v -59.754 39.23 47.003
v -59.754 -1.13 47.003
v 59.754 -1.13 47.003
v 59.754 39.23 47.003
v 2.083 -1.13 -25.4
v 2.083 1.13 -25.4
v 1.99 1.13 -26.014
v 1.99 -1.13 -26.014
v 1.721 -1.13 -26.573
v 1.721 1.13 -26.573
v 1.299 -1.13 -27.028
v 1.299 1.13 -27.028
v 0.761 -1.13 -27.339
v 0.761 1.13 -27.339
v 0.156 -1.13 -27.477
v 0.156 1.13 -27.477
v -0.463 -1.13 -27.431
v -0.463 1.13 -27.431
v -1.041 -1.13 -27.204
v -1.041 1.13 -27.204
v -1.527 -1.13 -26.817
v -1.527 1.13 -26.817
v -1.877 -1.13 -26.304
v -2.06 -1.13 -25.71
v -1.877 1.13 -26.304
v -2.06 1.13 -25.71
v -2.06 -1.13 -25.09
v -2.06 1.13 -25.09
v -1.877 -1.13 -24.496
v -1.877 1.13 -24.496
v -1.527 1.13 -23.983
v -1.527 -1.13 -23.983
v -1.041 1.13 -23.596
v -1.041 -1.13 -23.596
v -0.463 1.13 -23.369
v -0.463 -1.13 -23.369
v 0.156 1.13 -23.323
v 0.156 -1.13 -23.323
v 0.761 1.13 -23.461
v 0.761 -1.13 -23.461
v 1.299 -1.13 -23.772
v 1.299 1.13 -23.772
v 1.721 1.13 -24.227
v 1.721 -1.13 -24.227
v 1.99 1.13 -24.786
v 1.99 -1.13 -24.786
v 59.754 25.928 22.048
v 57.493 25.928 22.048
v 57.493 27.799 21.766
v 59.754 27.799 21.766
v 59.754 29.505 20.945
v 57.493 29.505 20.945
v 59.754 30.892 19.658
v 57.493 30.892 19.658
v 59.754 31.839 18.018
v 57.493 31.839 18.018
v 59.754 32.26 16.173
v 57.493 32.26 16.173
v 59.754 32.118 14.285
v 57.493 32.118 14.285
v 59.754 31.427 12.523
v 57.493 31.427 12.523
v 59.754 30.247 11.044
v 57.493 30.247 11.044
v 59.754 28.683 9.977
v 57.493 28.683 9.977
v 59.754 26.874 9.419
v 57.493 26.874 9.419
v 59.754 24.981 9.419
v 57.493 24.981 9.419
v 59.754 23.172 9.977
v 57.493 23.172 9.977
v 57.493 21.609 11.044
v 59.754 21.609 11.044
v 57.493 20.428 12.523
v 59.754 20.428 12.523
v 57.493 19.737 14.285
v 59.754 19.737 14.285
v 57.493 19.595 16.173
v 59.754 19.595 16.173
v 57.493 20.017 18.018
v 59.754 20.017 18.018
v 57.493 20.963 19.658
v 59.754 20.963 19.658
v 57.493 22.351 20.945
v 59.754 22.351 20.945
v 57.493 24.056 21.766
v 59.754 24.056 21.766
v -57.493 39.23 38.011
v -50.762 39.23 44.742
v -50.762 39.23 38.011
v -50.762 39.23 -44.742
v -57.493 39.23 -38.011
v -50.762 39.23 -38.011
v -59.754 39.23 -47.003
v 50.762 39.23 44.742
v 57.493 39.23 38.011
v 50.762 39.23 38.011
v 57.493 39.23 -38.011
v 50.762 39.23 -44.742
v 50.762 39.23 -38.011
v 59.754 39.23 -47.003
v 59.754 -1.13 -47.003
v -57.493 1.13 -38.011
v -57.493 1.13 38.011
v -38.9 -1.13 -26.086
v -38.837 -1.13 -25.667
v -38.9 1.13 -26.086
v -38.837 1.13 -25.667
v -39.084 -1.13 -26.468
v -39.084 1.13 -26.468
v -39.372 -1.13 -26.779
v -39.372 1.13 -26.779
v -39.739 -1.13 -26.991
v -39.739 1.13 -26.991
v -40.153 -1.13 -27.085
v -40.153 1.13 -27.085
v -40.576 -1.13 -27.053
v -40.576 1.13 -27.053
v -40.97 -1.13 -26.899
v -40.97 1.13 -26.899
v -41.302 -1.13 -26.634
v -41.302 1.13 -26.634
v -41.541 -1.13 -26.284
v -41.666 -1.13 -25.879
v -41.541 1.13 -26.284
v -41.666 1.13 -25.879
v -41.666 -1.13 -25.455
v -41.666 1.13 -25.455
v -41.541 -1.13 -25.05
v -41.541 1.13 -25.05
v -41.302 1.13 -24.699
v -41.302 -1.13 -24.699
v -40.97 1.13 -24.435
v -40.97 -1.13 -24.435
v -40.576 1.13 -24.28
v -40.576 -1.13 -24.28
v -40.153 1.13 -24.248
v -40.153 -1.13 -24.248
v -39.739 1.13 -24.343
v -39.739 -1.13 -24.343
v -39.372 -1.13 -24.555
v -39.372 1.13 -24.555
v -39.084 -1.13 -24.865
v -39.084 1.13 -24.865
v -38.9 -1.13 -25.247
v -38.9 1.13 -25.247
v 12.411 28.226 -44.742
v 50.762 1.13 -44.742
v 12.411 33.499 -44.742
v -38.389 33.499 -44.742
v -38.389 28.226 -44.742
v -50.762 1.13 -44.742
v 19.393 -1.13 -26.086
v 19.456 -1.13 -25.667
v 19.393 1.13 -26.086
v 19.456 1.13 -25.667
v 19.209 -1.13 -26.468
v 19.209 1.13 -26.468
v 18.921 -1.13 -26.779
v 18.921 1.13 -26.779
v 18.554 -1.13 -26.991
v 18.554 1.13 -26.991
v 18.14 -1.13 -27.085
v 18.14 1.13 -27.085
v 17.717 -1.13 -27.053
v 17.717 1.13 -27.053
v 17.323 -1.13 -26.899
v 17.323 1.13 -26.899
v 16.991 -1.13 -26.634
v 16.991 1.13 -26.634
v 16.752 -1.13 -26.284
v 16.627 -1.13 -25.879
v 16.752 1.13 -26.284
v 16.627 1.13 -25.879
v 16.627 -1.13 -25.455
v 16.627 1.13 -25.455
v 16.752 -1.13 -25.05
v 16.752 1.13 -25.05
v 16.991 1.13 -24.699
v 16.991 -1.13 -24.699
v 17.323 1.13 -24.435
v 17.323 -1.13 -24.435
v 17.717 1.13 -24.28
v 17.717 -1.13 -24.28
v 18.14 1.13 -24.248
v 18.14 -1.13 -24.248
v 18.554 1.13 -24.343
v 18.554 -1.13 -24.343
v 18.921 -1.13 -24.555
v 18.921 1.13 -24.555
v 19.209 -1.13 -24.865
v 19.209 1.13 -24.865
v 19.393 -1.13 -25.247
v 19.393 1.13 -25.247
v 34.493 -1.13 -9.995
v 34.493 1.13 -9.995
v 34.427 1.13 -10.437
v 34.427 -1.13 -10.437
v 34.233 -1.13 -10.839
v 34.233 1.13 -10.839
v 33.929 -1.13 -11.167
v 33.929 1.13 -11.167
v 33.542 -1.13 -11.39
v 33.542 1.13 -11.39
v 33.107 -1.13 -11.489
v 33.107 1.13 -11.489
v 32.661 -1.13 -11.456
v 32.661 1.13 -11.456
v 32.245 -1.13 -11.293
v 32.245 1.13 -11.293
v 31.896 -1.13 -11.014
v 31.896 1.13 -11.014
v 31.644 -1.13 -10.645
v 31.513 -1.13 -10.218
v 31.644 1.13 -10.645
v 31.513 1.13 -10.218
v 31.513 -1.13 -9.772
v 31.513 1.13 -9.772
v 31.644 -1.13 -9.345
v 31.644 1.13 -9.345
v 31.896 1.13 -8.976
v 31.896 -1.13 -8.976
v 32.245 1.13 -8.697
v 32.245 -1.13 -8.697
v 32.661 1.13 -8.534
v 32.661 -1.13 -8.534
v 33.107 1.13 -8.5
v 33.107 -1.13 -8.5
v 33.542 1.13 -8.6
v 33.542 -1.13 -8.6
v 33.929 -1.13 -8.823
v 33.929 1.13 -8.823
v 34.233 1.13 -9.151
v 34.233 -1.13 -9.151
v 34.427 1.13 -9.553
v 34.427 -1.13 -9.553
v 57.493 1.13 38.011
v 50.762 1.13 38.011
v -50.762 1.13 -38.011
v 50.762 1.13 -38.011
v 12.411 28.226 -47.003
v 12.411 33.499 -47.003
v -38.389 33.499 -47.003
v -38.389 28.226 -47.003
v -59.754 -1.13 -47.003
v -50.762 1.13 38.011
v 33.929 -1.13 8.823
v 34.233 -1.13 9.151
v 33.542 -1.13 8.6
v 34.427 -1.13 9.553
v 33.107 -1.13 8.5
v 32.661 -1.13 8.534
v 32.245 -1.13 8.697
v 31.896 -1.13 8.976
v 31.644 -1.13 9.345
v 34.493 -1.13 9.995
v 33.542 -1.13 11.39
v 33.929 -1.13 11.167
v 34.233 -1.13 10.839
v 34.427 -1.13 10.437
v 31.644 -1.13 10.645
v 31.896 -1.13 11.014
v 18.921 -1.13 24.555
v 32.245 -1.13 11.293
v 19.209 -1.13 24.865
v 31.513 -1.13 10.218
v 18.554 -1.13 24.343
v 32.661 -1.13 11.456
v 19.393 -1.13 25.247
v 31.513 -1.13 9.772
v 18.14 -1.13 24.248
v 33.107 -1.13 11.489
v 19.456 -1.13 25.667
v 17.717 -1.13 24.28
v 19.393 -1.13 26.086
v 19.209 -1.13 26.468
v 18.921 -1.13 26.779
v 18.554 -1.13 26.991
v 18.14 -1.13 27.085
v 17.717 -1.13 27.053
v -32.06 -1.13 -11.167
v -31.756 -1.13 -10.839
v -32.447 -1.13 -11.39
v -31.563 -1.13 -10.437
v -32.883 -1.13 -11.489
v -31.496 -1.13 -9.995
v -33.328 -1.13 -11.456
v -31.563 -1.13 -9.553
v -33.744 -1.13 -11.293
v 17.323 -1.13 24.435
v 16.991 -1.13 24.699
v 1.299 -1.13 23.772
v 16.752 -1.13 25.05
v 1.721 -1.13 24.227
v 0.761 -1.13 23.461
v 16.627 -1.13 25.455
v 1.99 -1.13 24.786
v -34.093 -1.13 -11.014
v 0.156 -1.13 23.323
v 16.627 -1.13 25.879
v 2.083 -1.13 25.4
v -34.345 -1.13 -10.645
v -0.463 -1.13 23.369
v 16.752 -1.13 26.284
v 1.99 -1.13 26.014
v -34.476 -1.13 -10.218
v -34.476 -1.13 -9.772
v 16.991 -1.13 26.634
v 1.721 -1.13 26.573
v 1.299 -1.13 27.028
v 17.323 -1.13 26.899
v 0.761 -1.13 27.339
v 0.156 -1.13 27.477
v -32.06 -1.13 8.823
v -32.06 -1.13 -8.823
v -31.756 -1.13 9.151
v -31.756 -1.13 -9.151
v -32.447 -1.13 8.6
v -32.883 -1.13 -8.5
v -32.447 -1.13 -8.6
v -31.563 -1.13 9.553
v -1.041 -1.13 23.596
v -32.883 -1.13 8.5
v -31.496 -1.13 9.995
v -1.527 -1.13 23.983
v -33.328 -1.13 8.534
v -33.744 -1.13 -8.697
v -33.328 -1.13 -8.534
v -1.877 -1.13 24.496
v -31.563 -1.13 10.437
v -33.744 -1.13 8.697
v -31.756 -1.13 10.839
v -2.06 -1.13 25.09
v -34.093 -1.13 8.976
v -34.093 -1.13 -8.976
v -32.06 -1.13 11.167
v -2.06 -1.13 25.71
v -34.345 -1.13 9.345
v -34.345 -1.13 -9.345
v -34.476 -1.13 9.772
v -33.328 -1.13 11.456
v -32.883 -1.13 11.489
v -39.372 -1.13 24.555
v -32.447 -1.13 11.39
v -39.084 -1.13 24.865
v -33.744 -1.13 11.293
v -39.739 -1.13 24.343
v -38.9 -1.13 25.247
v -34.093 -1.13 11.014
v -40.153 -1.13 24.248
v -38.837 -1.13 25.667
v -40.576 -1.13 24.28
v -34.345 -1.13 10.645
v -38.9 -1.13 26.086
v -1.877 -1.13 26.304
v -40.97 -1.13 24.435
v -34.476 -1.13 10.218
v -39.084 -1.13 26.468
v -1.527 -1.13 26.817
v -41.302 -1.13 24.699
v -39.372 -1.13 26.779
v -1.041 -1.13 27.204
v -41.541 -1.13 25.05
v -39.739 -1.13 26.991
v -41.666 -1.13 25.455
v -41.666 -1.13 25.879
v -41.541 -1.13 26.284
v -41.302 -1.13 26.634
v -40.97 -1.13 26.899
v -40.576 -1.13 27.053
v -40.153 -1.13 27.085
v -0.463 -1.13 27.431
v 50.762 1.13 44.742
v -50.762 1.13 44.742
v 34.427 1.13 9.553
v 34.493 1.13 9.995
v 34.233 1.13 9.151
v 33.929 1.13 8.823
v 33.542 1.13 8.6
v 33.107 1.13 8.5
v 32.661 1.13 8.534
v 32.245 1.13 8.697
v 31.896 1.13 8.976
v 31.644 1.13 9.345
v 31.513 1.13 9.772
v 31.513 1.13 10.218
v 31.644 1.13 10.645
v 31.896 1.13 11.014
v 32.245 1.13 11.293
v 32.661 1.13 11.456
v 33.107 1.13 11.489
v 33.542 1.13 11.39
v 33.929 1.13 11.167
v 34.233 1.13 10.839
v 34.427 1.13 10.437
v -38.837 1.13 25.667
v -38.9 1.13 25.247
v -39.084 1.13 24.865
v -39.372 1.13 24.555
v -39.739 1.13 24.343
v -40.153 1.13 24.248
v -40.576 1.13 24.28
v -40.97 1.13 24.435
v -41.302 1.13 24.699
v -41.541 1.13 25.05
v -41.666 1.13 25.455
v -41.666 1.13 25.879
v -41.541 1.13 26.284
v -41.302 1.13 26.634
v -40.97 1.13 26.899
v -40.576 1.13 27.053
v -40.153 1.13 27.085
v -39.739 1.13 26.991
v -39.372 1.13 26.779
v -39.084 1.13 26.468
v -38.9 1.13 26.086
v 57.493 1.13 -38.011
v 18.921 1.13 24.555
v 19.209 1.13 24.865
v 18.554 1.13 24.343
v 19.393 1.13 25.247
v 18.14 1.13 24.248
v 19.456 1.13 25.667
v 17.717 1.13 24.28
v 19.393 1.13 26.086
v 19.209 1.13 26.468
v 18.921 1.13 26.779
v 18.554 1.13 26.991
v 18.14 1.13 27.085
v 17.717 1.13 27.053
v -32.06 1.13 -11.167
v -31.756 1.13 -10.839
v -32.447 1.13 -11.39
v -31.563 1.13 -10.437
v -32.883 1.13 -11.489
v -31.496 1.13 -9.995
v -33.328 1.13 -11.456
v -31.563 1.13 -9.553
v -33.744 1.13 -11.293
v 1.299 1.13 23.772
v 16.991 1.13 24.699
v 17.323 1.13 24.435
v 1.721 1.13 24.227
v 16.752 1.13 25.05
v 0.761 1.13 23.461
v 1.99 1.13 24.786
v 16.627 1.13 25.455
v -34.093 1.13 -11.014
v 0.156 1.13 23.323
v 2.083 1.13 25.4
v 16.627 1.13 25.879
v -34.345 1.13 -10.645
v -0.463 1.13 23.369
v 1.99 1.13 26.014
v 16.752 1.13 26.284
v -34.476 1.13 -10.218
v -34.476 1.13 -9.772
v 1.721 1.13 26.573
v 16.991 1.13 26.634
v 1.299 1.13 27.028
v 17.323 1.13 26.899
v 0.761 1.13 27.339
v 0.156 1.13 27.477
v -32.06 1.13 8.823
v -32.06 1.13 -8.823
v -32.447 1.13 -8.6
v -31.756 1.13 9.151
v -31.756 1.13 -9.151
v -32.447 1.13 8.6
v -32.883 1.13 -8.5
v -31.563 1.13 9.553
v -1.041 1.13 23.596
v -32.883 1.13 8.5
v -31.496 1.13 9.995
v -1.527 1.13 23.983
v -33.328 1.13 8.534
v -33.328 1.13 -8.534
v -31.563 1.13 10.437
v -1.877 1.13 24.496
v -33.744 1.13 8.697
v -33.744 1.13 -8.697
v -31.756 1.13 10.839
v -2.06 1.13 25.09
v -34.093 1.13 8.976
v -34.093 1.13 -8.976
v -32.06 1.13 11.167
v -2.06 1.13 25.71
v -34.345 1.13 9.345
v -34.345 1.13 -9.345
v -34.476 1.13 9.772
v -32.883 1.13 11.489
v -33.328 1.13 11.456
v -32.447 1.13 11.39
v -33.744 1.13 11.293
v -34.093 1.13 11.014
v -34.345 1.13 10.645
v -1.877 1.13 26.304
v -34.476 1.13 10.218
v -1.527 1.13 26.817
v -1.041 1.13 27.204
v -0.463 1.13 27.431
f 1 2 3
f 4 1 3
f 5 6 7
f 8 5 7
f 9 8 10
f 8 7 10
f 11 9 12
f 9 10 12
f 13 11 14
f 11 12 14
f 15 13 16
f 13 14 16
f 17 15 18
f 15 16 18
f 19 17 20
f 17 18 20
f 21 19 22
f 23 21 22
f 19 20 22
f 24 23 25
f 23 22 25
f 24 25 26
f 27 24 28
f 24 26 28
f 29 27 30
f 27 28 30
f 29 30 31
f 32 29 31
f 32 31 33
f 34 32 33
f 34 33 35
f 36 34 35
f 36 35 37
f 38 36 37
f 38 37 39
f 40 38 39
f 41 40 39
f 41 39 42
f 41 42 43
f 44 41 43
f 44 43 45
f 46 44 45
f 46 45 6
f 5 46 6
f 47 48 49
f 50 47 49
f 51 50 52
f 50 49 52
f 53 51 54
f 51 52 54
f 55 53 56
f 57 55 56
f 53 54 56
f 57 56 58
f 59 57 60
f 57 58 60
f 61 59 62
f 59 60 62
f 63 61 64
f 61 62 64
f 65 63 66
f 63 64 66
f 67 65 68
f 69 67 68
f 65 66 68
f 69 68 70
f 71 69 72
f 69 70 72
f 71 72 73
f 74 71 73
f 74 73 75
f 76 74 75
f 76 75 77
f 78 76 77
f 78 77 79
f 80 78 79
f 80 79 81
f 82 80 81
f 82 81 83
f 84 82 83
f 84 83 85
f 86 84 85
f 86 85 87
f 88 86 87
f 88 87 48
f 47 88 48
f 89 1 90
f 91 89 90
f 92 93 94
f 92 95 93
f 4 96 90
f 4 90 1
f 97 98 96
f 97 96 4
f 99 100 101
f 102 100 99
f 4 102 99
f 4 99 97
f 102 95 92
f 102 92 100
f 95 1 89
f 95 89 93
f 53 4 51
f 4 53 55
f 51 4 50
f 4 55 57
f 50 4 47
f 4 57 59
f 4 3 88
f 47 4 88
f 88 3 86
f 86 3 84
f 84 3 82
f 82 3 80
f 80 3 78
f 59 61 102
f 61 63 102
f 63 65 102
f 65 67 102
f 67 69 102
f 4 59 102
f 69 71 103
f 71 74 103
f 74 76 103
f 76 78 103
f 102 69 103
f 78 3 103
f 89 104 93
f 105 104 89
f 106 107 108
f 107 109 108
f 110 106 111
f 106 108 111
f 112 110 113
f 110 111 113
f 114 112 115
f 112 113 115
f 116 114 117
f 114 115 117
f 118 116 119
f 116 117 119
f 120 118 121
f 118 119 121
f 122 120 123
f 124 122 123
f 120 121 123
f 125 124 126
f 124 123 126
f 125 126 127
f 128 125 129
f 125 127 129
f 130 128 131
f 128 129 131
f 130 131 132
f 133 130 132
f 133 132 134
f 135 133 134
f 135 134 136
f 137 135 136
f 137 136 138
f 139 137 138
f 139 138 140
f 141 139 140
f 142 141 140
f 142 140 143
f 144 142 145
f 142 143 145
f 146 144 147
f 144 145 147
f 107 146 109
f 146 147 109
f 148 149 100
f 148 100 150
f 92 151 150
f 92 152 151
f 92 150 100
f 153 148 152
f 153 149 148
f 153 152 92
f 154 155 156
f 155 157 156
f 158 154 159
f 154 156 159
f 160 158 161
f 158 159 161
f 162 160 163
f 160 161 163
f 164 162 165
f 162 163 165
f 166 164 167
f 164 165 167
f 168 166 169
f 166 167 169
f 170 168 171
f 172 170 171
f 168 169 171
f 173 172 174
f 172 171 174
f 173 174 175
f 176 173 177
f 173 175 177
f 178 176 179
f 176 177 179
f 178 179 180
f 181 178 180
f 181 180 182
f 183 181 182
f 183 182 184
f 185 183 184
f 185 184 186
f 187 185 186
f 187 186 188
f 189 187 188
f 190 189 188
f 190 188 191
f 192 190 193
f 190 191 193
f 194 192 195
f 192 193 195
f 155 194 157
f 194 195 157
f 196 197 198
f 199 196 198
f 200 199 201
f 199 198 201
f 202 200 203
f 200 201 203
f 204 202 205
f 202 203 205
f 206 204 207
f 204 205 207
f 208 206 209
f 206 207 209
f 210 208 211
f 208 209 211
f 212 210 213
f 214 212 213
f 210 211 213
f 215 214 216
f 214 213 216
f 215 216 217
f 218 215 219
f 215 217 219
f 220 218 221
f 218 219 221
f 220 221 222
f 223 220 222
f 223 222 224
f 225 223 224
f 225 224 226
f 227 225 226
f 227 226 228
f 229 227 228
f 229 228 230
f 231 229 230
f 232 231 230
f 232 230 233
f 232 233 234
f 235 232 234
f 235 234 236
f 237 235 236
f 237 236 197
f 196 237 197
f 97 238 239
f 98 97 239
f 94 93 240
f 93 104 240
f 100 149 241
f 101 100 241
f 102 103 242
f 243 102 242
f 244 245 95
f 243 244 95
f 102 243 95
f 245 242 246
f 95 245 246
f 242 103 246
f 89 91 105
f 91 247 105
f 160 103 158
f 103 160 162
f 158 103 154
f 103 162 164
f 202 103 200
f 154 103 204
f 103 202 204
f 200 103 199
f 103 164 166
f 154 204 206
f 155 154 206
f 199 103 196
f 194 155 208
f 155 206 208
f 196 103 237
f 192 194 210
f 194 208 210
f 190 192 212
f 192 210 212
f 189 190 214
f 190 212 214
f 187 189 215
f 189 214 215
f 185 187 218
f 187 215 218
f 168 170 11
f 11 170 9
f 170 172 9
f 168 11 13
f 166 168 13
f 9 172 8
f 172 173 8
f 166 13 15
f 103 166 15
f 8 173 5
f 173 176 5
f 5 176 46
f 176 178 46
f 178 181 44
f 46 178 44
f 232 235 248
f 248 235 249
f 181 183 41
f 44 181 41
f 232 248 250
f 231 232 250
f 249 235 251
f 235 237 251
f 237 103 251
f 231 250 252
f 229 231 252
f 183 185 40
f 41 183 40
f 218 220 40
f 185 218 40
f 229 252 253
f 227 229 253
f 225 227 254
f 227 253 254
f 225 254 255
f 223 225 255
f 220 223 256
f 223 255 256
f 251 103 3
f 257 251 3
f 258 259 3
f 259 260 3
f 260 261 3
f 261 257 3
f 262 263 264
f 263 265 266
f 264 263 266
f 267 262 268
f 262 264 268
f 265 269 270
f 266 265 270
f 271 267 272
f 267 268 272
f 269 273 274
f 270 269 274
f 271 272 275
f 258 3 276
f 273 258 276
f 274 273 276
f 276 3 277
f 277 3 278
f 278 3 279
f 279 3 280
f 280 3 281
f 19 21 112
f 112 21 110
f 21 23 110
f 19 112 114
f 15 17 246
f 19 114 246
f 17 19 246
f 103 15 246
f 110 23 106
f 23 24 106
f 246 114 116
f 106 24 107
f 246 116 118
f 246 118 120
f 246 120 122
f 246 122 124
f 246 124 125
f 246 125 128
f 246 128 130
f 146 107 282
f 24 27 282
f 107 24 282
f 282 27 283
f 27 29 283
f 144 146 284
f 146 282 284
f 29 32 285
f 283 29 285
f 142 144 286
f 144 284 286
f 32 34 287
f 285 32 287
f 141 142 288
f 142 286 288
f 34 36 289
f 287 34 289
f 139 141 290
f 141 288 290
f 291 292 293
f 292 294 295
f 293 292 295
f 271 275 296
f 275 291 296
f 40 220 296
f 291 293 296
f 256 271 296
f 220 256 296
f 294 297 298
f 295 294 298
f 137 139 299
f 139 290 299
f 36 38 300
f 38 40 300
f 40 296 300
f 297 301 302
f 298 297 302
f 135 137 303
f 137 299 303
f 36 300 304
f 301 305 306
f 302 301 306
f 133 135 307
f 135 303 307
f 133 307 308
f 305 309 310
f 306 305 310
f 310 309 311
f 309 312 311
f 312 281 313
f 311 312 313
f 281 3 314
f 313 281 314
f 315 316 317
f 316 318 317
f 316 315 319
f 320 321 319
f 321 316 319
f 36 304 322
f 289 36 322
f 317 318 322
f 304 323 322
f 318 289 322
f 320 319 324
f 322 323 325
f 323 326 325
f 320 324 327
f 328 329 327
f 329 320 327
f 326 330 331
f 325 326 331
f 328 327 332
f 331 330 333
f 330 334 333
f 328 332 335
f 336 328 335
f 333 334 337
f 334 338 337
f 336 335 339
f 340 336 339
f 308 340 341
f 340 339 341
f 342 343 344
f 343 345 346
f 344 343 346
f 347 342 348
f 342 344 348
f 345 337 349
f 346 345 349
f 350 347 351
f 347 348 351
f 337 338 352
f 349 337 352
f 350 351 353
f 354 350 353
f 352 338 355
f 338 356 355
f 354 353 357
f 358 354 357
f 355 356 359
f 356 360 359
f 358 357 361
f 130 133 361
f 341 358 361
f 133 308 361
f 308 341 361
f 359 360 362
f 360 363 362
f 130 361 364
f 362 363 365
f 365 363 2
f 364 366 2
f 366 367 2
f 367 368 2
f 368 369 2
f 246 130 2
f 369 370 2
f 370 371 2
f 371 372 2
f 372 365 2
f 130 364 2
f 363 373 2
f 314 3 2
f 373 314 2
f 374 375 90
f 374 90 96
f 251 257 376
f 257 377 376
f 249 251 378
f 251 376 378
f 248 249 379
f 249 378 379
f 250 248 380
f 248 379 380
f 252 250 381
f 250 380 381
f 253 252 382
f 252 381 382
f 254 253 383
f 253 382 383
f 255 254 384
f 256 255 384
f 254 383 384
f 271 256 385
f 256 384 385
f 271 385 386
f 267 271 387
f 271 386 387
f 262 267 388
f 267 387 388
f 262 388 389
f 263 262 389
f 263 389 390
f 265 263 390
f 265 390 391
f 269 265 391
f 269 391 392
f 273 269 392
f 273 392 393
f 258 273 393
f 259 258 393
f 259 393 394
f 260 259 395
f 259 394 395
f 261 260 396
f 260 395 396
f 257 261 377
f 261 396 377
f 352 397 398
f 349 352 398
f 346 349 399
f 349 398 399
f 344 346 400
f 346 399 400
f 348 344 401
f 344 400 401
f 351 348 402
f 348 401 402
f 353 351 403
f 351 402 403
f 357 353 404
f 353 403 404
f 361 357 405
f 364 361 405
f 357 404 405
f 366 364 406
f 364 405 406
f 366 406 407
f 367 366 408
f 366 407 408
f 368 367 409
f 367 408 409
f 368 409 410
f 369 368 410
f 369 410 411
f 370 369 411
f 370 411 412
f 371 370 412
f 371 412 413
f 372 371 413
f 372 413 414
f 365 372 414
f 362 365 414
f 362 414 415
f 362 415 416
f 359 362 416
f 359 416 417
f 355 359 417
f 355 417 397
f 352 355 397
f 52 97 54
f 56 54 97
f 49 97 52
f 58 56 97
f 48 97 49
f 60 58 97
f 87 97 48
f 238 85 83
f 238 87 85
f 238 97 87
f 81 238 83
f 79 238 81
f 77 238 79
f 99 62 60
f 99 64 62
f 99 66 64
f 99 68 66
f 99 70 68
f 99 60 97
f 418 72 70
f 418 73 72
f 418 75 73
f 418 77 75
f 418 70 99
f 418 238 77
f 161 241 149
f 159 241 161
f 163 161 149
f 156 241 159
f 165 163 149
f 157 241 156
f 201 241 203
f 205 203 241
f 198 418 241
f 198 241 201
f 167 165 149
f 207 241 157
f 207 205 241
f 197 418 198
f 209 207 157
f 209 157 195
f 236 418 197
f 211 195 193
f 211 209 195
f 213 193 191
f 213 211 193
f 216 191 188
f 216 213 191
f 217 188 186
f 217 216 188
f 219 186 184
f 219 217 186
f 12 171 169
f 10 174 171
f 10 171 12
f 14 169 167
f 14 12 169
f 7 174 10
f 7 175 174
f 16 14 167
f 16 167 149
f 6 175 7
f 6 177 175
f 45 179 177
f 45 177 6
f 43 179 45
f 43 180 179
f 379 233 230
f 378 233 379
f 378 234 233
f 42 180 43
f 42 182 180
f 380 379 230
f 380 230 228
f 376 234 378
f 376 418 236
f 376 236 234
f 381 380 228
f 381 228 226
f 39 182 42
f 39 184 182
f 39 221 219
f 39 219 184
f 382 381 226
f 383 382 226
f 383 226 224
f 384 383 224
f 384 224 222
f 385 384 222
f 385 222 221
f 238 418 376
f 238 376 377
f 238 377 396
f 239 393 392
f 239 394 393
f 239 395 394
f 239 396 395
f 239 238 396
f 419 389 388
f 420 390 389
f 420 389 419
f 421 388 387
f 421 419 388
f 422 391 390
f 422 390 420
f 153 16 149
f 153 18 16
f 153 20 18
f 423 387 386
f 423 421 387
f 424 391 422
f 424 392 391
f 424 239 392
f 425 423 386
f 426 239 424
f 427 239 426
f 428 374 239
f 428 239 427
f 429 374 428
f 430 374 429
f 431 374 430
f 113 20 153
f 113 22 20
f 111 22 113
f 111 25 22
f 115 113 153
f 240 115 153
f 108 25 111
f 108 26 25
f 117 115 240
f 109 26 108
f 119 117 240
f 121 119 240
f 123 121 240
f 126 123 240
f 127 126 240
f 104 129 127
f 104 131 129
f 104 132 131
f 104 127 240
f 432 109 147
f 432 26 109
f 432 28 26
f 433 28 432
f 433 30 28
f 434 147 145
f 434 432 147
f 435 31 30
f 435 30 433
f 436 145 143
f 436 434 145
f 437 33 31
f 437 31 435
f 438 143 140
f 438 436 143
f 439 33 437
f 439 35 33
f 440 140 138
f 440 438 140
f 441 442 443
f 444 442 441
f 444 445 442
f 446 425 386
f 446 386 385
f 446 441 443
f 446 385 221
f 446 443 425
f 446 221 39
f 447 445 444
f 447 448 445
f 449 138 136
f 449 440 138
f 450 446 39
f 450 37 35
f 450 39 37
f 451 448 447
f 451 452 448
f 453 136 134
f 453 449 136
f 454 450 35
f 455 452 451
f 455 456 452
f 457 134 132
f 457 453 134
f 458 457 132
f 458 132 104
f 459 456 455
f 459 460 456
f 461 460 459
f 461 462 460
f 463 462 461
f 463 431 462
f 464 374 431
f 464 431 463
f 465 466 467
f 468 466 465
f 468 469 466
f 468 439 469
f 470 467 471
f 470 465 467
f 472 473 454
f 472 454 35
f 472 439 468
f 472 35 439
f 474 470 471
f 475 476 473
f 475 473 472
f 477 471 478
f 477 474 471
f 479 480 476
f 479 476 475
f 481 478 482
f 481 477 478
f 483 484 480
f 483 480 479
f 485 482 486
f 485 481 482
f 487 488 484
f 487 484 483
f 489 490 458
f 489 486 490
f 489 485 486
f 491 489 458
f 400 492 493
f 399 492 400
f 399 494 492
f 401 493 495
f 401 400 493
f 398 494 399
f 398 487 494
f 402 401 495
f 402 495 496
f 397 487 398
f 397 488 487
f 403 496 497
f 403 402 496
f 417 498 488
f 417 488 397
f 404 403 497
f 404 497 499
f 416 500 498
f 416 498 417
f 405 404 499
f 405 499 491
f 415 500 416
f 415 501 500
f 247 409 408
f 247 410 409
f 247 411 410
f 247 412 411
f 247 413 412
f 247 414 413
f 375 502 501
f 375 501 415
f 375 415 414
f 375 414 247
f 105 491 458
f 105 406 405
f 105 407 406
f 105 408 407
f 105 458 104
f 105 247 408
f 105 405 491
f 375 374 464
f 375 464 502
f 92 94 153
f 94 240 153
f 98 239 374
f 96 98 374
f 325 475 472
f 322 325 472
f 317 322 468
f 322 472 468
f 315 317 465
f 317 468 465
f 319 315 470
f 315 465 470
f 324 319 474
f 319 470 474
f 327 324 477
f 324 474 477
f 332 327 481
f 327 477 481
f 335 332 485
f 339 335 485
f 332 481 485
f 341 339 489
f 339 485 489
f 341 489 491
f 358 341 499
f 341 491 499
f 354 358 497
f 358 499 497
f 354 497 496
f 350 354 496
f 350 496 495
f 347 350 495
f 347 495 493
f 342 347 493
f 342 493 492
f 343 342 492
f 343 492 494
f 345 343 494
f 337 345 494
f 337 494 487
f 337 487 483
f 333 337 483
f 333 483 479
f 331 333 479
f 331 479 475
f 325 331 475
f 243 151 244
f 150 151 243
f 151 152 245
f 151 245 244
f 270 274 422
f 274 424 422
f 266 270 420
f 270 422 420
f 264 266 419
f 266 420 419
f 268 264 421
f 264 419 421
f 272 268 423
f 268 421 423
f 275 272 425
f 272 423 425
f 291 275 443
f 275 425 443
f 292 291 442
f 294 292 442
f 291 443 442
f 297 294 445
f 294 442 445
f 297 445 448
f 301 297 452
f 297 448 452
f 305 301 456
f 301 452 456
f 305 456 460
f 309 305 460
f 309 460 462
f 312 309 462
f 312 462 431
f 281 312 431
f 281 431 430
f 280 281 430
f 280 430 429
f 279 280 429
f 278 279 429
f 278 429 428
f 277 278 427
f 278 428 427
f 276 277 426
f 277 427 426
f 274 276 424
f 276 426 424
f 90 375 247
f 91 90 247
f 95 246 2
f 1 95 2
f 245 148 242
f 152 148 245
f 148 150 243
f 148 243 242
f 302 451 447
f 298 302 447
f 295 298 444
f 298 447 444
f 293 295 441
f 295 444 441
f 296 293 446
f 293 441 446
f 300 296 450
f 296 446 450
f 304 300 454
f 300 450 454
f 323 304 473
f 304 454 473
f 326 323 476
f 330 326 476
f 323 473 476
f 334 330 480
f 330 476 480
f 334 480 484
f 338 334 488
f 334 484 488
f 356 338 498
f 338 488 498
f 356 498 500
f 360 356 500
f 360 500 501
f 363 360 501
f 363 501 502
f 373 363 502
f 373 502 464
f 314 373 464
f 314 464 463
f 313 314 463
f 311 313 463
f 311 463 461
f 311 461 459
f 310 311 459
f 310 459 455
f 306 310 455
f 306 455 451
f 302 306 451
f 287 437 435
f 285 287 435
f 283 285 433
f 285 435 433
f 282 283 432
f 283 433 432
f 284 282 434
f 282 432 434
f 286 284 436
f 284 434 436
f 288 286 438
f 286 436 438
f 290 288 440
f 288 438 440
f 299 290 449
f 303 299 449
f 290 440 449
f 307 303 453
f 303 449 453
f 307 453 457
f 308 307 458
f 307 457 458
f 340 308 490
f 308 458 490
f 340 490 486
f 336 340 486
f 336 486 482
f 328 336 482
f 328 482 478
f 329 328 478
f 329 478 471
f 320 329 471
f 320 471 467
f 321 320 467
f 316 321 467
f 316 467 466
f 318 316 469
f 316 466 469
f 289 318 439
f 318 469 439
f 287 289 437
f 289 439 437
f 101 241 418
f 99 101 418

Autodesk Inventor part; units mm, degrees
ref_plane "YZ Plane" through (0, 0, 0) normal (1, 0, 0) x (0, 1, 0)
ref_plane "XZ Plane" through (0, 0, 0) normal (0, 1, 0) x (-1, 0, 0)
ref_plane "XY Plane" through (0, 0, 0) normal (0, 0, 1) x (1, 0, 0)
sketch "Sketch1" plane through (0, 0, 0) normal (0, 1, 0) x (-1, 0, 0)
  line L0 (-59.7535, -47.0027) -> (59.7535, -47.0027)
  line L1 (59.7535, -47.0027) -> (59.7535, 47.0027)
  line L2 (59.7535, 47.0027) -> (-59.7535, 47.0027)
  line L3 (-59.7535, 47.0027) -> (-59.7535, -47.0027)
  line L4 (-59.7535, -47.0027) -> (59.7535, 47.0027) construction
  line L5 (59.7535, -47.0027) -> (-59.7535, 47.0027) construction
  point P0 (0, 0)
  dimension "d0" = 119.507
  dimension "d1" = 94.0054
extrude "Extrusion1" add sketch "Sketch1" along normal mid plane 2.2606
sketch "Sketch2" plane through (0, 1.1303, 0) normal (0, 1, 0) x (1, 0, 0)
  line L0 (-59.7535, 47.0027) -> (-59.7535, -47.0027) projected
  line L1 (59.7535, -47.0027) -> (59.7535, 47.0027) projected
  line L2 (-59.7535, -47.0027) -> (59.7535, -47.0027)
  line L3 (59.7535, -47.0027) -> (59.7535, 47.0027)
  line L4 (59.7535, 47.0027) -> (-59.7535, 47.0027)
  line L5 (-59.7535, 47.0027) -> (-59.7535, -47.0027)
  line L6 (57.4929, -44.7421) -> (-57.4929, 44.7421) construction
  line L7 (-57.4929, -44.7421) -> (57.4929, 44.7421) construction
  line L8 (-59.7535, -47.0027) -> (59.7535, -47.0027) projected
  line L9 (-59.7535, -47.0027) -> (-50.7619, -47.0027)
  line L10 (-59.7535, -38.0111) -> (-59.7535, -47.0027)
  line L11 (-59.7535, 47.0027) -> (-50.7619, 47.0027)
  line L12 (-59.7535, 38.0111) -> (-59.7535, 47.0027)
  line L13 (59.7535, 47.0027) -> (-59.7535, 47.0027) projected
  line L14 (59.7535, 47.0027) -> (50.7619, 47.0027)
  line L15 (59.7535, 38.0111) -> (59.7535, 47.0027)
  line L16 (59.7535, -47.0027) -> (50.7619, -47.0027)
  line L17 (59.7535, -38.0111) -> (59.7535, -47.0027)
  line L18 (-50.7619, -44.7421) -> (-50.7619, -38.0111)
  line L19 (-50.7619, -38.0111) -> (-57.4929, -38.0111)
  line L20 (-57.4929, 38.0111) -> (-50.7619, 38.0111)
  line L21 (-50.7619, 38.0111) -> (-50.7619, 44.7421)
  line L22 (50.7619, 38.0111) -> (57.4929, 38.0111)
  line L23 (50.7619, 44.7421) -> (50.7619, 38.0111)
  line L24 (57.4929, -38.0111) -> (50.7619, -38.0111)
  line L25 (50.7619, -38.0111) -> (50.7619, -44.7421)
  line L26 (-50.7619, -44.7421) -> (50.7619, -44.7421)
  line L27 (57.4929, -38.0111) -> (57.4929, 38.0111)
  line L28 (50.7619, 44.7421) -> (-50.7619, 44.7421)
  line L29 (-57.4929, 38.0111) -> (-57.4929, -38.0111)
  point P0 (0, 0)
  dimension "d4" = 114.9858
  dimension "d5" = 89.4842
  dimension "d6" = 8.9916
  dimension "d7" = 8.9916
  dimension "d10" = 8.9916
  dimension "d11" = 8.9916
extrude "Extrusion2" add sketch "Sketch2" along normal blind 38.1
sketch "Sketch3" plane through (0, 1.1303, 0) normal (0, 1, 0) x (1, 0, 0)
  circle A0 centre (0, -25.4) radius 2.0828
  circle A1 centre (0, 25.4) radius 2.0828
  point P0 (0, 0)
  dimension "d18" = 4.1656
  dimension "d19" = 4.1656
extrude "Extrusion3" cut sketch "Sketch3" against normal through all
sketch "Sketch4" plane through (0, 1.1303, 0) normal (0, 1, 0) x (1, 0, 0)
  line L0 (43.434, -28.8417) -> (-43.434, 28.8417) construction
  line L1 (-43.434, -28.8417) -> (43.434, 28.8417) construction
  line L2 (32.9946, -9.9949) -> (-32.9946, 9.9949) construction
  line L3 (-32.9946, -9.9949) -> (32.9946, 9.9949) construction
  circle A0 centre (-40.259, -25.6667) radius 1.4224
  circle A1 centre (-40.259, 25.6667) radius 1.4224
  circle A2 centre (18.034, -25.6667) radius 1.4224
  circle A3 centre (18.034, 25.6667) radius 1.4224
  circle A4 centre (-32.9946, -9.9949) radius 1.4986
  circle A5 centre (-32.9946, 9.9949) radius 1.4986
  circle A6 centre (32.9946, 9.9949) radius 1.4986
  circle A7 centre (32.9946, -9.9949) radius 1.4986
  point P0 (0, 0)
  point P1 (0, 0)
  dimension "d22" = 86.868
  dimension "d23" = 57.6834
  dimension "d25" = 19.9898
  dimension "d30" = 2.8448
  dimension "d31" = 2.8448
  dimension "d36" = 2.8448
  dimension "d37" = 2.8448
  dimension "d38" = 2.9972
  dimension "d39" = 2.9972
  dimension "d40" = 2.9972
  dimension "d41" = 2.9972
extrude "Extrusion4" cut sketch "Sketch4" against normal through all
sketch "Sketch6" plane through (57.4929, 1.1303, -38.0111) normal (-1, 0, 0) x (0, 0, 1)
  circle A0 centre (53.7096, 24.7973) radius 6.35
  point P0 (38.0111, -1.1303)
  dimension "d44" = 12.7
extrude "Extrusion5" cut sketch "Sketch6" against normal through all
sketch "Sketch7" plane through (-50.7619, 1.1303, -44.7421) normal (0, 0, 1) x (1, 0, 0)
  line L0 (12.3731, 32.369) -> (63.1731, 32.369)
  line L1 (63.1731, 32.369) -> (63.1731, 27.0954)
  line L2 (63.1731, 27.0954) -> (12.3731, 27.0954)
  line L3 (12.3731, 27.0954) -> (12.3731, 32.369)
  point P0 (50.7619, -1.1303)
  dimension "d47" = 50.8
extrude "Extrusion6" cut sketch "Sketch7" against normal through all
properties part number "546-1590BBS-Pi"
